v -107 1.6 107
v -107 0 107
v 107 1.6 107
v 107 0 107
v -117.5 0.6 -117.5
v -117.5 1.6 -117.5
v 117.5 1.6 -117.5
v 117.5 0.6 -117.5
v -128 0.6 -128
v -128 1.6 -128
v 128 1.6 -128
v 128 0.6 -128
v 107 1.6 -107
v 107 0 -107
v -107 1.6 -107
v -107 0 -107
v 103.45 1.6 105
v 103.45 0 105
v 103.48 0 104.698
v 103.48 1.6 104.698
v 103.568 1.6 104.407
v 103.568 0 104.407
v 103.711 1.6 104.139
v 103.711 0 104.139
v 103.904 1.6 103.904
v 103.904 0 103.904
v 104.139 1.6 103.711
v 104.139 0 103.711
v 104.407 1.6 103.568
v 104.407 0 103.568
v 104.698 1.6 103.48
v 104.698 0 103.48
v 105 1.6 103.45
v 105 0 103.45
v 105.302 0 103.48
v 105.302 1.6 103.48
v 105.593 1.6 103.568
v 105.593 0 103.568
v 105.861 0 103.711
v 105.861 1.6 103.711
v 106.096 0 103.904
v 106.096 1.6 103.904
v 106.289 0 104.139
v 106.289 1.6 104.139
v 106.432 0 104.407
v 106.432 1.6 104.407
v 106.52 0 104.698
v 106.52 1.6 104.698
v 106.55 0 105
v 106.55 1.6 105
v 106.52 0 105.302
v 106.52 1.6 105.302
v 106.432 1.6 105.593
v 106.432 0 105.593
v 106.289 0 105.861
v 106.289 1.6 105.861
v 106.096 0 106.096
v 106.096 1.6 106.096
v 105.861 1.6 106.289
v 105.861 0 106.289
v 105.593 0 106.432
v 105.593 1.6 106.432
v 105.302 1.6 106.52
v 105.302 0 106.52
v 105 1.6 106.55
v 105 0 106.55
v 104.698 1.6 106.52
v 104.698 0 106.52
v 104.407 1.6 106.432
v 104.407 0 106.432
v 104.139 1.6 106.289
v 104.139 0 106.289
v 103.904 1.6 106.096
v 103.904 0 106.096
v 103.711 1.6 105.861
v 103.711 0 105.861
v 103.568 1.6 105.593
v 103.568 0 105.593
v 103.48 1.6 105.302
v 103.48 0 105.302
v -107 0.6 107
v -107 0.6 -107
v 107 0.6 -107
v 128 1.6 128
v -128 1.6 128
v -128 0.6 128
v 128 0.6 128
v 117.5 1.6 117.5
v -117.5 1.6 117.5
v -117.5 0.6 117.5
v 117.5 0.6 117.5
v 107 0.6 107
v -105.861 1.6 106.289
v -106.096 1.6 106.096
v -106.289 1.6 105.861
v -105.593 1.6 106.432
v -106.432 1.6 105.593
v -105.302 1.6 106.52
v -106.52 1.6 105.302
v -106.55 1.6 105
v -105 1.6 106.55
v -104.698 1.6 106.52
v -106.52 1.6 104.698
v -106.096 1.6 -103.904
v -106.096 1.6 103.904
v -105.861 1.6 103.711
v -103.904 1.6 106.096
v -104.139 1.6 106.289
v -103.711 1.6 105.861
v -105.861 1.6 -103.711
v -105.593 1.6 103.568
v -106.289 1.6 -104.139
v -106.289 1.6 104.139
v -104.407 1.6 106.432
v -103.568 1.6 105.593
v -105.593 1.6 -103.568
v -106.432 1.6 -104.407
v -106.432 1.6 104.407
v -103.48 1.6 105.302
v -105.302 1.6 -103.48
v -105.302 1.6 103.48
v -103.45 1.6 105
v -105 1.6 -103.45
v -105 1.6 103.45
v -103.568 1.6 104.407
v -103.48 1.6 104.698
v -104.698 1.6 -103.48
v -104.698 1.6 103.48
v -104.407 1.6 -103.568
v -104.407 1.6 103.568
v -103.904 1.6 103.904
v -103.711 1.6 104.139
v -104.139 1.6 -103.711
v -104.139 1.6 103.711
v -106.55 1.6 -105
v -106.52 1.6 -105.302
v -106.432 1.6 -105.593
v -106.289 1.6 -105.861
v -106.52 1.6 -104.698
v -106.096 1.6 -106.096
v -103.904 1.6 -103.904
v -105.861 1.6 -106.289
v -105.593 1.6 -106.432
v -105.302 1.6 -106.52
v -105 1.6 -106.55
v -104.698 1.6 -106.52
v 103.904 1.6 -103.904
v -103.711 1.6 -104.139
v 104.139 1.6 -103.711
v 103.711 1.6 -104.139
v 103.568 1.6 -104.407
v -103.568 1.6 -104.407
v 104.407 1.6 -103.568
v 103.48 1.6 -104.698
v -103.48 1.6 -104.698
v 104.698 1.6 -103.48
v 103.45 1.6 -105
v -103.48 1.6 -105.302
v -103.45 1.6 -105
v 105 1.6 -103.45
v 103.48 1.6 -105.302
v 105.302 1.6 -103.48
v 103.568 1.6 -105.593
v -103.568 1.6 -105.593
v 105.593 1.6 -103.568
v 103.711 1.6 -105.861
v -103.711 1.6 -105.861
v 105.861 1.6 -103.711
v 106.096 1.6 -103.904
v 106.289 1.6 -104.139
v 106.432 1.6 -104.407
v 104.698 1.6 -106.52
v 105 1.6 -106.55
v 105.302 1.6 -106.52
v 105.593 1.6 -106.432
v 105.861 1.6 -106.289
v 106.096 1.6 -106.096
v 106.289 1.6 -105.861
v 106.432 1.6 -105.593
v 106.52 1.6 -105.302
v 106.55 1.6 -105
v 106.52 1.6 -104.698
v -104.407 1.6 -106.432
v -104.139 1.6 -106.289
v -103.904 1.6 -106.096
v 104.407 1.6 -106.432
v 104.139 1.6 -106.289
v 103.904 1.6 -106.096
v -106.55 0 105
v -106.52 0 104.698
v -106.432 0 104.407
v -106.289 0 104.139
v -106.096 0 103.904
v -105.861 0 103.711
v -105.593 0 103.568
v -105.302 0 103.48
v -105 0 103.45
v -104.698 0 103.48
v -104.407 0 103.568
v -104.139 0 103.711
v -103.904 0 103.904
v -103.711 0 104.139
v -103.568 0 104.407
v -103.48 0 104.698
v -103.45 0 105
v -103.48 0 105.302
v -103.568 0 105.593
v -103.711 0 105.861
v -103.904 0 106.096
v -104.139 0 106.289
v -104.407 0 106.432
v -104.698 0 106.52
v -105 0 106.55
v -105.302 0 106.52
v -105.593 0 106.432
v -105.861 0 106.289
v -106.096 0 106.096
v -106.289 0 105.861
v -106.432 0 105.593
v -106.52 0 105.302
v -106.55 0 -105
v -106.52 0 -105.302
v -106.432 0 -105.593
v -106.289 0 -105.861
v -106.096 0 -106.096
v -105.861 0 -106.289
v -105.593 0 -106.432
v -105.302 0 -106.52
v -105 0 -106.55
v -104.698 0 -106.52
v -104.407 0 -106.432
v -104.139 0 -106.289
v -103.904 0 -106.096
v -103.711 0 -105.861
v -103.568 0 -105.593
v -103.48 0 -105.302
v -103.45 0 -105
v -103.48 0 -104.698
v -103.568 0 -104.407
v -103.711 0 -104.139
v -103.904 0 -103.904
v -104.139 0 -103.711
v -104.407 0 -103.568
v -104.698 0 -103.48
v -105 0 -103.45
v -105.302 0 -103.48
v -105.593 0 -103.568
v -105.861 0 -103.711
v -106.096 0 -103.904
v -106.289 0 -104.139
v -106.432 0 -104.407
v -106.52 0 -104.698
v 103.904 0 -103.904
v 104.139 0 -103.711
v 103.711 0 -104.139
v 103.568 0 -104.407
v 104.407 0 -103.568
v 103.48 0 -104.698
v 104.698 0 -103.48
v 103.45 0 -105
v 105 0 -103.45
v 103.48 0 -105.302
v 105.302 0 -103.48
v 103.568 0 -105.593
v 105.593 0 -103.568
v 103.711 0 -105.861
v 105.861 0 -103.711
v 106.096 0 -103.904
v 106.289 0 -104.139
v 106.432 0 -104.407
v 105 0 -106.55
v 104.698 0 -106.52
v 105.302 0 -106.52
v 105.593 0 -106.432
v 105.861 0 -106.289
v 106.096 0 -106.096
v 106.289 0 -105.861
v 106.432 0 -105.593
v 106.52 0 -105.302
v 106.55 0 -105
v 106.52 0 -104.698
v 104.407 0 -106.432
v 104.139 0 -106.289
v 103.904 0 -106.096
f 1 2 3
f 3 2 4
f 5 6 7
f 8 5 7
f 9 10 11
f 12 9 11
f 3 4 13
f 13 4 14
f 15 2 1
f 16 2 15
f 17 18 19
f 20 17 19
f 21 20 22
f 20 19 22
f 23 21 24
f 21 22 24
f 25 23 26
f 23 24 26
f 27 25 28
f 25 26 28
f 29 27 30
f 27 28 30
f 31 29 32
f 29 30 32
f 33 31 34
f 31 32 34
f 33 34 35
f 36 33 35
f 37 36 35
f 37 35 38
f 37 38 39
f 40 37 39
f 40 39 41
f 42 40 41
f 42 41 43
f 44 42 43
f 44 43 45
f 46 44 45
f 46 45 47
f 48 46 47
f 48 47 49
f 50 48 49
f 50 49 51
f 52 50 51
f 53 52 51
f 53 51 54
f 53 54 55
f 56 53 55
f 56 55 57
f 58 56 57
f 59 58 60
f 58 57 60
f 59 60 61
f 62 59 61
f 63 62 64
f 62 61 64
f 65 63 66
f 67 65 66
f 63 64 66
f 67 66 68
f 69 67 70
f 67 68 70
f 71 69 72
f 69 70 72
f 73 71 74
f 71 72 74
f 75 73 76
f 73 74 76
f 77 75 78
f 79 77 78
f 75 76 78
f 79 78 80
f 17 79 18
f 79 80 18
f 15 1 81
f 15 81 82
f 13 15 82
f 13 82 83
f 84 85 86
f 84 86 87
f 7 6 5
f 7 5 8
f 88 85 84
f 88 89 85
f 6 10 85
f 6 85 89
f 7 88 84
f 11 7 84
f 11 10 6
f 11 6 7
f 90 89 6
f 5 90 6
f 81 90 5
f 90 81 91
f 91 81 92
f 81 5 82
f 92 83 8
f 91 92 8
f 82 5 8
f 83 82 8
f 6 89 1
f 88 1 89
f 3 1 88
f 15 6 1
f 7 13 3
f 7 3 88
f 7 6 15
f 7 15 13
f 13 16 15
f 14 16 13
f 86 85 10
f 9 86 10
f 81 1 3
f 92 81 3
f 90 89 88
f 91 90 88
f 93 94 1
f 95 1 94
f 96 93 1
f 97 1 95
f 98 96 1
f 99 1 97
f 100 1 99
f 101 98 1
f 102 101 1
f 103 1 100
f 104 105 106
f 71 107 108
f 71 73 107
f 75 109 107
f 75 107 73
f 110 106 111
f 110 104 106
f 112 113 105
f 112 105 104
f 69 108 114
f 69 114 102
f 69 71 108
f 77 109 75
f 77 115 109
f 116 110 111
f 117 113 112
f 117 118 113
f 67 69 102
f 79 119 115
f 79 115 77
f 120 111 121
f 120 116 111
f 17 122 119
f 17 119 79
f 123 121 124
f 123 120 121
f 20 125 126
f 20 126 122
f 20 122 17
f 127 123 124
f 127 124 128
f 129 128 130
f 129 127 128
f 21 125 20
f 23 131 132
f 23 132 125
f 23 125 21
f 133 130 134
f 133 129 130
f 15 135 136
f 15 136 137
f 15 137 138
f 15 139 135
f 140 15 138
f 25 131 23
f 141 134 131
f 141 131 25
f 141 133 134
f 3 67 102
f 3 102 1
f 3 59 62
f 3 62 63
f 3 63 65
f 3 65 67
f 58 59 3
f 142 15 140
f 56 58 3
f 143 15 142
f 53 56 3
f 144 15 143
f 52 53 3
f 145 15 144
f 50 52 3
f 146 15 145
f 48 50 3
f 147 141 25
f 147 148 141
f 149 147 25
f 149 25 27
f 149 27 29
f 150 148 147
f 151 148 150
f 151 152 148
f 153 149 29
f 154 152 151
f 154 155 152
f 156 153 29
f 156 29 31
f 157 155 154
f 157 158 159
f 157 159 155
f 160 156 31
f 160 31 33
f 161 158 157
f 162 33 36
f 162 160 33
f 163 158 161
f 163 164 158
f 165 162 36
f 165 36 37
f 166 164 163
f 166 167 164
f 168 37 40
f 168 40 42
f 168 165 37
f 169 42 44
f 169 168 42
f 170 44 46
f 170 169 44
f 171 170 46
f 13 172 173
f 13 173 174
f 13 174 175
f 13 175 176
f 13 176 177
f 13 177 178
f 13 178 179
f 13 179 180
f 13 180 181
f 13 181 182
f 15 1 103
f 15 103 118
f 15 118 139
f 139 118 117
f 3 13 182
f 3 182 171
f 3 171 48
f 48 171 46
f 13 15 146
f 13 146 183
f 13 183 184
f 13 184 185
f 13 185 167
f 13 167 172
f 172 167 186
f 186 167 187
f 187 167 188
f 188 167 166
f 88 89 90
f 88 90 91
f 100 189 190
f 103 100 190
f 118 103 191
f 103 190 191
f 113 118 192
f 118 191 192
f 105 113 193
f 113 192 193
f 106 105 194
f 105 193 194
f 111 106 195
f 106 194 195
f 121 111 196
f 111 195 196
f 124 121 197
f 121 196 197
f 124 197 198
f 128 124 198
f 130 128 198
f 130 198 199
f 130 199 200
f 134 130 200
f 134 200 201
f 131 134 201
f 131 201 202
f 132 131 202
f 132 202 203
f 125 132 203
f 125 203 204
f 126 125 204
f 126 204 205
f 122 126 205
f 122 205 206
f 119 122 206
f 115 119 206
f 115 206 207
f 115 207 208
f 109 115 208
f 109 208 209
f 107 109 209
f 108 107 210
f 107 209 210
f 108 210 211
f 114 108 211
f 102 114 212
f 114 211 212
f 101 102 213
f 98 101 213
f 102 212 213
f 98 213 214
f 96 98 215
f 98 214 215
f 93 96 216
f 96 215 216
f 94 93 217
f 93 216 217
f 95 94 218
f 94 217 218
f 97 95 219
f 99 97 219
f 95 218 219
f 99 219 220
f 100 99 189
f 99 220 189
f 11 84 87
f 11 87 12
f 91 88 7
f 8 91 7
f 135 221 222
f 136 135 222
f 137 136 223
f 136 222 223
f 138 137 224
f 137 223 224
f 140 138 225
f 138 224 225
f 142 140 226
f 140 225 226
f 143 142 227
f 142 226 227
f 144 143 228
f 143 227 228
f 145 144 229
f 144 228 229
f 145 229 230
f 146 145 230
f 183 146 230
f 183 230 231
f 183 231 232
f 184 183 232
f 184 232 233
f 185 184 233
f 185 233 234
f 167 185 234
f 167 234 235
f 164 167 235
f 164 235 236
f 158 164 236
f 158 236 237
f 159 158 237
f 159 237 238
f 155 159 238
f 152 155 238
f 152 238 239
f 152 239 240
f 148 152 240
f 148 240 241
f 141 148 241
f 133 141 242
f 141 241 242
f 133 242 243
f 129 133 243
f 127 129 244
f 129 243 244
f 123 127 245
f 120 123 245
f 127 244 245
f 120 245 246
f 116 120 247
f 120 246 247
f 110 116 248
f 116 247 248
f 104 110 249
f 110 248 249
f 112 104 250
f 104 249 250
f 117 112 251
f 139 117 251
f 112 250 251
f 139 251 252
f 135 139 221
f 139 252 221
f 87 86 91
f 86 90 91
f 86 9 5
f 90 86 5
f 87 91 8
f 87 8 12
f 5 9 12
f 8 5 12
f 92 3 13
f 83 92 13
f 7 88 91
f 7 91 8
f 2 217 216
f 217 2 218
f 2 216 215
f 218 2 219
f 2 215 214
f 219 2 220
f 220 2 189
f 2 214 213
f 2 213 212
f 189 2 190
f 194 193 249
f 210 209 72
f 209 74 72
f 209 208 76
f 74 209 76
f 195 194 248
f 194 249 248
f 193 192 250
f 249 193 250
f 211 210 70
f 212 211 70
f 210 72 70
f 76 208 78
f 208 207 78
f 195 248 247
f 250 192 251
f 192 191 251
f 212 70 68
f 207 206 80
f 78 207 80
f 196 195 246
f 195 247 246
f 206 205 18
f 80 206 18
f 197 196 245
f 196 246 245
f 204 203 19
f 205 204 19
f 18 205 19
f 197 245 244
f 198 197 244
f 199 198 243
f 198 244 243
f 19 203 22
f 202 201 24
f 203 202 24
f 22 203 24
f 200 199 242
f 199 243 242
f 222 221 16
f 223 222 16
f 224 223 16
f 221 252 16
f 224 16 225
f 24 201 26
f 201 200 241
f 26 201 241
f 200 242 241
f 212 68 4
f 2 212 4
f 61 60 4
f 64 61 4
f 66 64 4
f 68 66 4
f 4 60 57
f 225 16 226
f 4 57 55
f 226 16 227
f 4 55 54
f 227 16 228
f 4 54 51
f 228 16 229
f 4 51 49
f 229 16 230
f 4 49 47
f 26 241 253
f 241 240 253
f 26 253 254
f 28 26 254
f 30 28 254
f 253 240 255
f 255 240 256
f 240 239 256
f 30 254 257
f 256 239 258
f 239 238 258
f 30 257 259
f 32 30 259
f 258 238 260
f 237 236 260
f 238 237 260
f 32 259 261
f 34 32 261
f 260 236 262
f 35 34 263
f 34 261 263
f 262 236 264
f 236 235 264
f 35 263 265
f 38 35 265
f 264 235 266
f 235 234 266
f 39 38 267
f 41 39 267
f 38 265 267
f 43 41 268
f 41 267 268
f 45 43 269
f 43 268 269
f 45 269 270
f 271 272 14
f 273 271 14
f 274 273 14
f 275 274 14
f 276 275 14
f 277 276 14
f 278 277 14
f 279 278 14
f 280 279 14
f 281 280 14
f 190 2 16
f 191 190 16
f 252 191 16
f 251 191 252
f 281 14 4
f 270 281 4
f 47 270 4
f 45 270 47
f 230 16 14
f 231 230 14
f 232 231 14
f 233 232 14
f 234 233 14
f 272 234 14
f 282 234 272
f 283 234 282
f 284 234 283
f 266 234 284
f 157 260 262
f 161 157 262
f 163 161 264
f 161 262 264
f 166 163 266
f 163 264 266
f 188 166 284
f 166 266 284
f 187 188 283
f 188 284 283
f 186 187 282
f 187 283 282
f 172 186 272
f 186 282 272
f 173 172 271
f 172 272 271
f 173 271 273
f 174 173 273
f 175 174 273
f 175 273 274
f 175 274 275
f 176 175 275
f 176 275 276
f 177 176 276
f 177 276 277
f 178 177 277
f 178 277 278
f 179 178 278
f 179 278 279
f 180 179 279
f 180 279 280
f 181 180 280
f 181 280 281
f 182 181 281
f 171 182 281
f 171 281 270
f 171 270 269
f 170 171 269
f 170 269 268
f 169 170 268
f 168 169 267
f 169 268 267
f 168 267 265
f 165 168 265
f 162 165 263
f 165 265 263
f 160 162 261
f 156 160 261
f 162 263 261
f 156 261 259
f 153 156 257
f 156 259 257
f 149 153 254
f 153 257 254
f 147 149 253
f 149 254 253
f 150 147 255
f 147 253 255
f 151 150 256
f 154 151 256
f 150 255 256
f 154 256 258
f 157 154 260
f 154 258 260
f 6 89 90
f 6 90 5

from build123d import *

# Parameters (mm, degrees)
SKETCH1_W                  = 214
SKETCH1_H                  = 214
BOSS_EXTRUDE1_DEPTH        = 1.6
M2_5_CLEARANCE_HOLE1_D     = 3.1
M2_5_CLEARANCE_HOLE1_DEPTH = 11.938
M2_5_CLEARANCE_HOLE1_TIP   = 0.931333959
SKETCH5_W                  = 235
SKETCH5_H                  = 235
SKETCH5_W_2                = 214
SKETCH5_H_2                = 214
BOSS_EXTRUDE2_DEPTH        = 1
SKETCH6_W                  = 256
SKETCH6_H                  = 256
SKETCH6_W_2                = 235
SKETCH6_H_2                = 235
BOSS_EXTRUDE3_DEPTH        = 1


with BuildPart() as part:
    # Sketch1 → Boss-Extrude1 (new body)
    with BuildSketch(Plane(origin=(0, 0, 0), x_dir=(1, 0, 0), z_dir=(0, 1, 0))):
        Rectangle(SKETCH1_W, SKETCH1_H)
    extrude(amount=BOSS_EXTRUDE1_DEPTH)

    # M2.5 Clearance Hole1
    with Locations(Plane(origin=(0, 1.6, 0), x_dir=(1, 0, 0), z_dir=(0, 1, 0))):
        with Locations((-105, 105), (105, 105), (105, -105), (-105, -105)):
            Hole(M2_5_CLEARANCE_HOLE1_D / 2, depth=M2_5_CLEARANCE_HOLE1_DEPTH)
            with Locations((0, 0, -(M2_5_CLEARANCE_HOLE1_DEPTH + M2_5_CLEARANCE_HOLE1_TIP / 2))):  # 118° drill point
                Cone(0, M2_5_CLEARANCE_HOLE1_D / 2, M2_5_CLEARANCE_HOLE1_TIP, mode=Mode.SUBTRACT)


with BuildPart() as body_2:
    # Sketch5 → Boss-Extrude2 (new body)
    with BuildSketch(Plane(origin=(0, 1.6, 0), x_dir=(1, 0, 0), z_dir=(0, 1, 0))):
        Rectangle(SKETCH5_W, SKETCH5_H)
        Rectangle(SKETCH5_W_2, SKETCH5_H_2, mode=Mode.SUBTRACT)
    extrude(amount=-BOSS_EXTRUDE2_DEPTH)


with BuildPart() as body_3:
    # Sketch6 → Boss-Extrude3 (new body)
    with BuildSketch(Plane(origin=(0, 1.6, 0), x_dir=(1, 0, 0), z_dir=(0, 1, 0))):
        Rectangle(SKETCH6_W, SKETCH6_H)
        Rectangle(SKETCH6_W_2, SKETCH6_H_2, mode=Mode.SUBTRACT)
    extrude(amount=-BOSS_EXTRUDE3_DEPTH)


solid = Compound([part.part, body_2.part, body_3.part])
